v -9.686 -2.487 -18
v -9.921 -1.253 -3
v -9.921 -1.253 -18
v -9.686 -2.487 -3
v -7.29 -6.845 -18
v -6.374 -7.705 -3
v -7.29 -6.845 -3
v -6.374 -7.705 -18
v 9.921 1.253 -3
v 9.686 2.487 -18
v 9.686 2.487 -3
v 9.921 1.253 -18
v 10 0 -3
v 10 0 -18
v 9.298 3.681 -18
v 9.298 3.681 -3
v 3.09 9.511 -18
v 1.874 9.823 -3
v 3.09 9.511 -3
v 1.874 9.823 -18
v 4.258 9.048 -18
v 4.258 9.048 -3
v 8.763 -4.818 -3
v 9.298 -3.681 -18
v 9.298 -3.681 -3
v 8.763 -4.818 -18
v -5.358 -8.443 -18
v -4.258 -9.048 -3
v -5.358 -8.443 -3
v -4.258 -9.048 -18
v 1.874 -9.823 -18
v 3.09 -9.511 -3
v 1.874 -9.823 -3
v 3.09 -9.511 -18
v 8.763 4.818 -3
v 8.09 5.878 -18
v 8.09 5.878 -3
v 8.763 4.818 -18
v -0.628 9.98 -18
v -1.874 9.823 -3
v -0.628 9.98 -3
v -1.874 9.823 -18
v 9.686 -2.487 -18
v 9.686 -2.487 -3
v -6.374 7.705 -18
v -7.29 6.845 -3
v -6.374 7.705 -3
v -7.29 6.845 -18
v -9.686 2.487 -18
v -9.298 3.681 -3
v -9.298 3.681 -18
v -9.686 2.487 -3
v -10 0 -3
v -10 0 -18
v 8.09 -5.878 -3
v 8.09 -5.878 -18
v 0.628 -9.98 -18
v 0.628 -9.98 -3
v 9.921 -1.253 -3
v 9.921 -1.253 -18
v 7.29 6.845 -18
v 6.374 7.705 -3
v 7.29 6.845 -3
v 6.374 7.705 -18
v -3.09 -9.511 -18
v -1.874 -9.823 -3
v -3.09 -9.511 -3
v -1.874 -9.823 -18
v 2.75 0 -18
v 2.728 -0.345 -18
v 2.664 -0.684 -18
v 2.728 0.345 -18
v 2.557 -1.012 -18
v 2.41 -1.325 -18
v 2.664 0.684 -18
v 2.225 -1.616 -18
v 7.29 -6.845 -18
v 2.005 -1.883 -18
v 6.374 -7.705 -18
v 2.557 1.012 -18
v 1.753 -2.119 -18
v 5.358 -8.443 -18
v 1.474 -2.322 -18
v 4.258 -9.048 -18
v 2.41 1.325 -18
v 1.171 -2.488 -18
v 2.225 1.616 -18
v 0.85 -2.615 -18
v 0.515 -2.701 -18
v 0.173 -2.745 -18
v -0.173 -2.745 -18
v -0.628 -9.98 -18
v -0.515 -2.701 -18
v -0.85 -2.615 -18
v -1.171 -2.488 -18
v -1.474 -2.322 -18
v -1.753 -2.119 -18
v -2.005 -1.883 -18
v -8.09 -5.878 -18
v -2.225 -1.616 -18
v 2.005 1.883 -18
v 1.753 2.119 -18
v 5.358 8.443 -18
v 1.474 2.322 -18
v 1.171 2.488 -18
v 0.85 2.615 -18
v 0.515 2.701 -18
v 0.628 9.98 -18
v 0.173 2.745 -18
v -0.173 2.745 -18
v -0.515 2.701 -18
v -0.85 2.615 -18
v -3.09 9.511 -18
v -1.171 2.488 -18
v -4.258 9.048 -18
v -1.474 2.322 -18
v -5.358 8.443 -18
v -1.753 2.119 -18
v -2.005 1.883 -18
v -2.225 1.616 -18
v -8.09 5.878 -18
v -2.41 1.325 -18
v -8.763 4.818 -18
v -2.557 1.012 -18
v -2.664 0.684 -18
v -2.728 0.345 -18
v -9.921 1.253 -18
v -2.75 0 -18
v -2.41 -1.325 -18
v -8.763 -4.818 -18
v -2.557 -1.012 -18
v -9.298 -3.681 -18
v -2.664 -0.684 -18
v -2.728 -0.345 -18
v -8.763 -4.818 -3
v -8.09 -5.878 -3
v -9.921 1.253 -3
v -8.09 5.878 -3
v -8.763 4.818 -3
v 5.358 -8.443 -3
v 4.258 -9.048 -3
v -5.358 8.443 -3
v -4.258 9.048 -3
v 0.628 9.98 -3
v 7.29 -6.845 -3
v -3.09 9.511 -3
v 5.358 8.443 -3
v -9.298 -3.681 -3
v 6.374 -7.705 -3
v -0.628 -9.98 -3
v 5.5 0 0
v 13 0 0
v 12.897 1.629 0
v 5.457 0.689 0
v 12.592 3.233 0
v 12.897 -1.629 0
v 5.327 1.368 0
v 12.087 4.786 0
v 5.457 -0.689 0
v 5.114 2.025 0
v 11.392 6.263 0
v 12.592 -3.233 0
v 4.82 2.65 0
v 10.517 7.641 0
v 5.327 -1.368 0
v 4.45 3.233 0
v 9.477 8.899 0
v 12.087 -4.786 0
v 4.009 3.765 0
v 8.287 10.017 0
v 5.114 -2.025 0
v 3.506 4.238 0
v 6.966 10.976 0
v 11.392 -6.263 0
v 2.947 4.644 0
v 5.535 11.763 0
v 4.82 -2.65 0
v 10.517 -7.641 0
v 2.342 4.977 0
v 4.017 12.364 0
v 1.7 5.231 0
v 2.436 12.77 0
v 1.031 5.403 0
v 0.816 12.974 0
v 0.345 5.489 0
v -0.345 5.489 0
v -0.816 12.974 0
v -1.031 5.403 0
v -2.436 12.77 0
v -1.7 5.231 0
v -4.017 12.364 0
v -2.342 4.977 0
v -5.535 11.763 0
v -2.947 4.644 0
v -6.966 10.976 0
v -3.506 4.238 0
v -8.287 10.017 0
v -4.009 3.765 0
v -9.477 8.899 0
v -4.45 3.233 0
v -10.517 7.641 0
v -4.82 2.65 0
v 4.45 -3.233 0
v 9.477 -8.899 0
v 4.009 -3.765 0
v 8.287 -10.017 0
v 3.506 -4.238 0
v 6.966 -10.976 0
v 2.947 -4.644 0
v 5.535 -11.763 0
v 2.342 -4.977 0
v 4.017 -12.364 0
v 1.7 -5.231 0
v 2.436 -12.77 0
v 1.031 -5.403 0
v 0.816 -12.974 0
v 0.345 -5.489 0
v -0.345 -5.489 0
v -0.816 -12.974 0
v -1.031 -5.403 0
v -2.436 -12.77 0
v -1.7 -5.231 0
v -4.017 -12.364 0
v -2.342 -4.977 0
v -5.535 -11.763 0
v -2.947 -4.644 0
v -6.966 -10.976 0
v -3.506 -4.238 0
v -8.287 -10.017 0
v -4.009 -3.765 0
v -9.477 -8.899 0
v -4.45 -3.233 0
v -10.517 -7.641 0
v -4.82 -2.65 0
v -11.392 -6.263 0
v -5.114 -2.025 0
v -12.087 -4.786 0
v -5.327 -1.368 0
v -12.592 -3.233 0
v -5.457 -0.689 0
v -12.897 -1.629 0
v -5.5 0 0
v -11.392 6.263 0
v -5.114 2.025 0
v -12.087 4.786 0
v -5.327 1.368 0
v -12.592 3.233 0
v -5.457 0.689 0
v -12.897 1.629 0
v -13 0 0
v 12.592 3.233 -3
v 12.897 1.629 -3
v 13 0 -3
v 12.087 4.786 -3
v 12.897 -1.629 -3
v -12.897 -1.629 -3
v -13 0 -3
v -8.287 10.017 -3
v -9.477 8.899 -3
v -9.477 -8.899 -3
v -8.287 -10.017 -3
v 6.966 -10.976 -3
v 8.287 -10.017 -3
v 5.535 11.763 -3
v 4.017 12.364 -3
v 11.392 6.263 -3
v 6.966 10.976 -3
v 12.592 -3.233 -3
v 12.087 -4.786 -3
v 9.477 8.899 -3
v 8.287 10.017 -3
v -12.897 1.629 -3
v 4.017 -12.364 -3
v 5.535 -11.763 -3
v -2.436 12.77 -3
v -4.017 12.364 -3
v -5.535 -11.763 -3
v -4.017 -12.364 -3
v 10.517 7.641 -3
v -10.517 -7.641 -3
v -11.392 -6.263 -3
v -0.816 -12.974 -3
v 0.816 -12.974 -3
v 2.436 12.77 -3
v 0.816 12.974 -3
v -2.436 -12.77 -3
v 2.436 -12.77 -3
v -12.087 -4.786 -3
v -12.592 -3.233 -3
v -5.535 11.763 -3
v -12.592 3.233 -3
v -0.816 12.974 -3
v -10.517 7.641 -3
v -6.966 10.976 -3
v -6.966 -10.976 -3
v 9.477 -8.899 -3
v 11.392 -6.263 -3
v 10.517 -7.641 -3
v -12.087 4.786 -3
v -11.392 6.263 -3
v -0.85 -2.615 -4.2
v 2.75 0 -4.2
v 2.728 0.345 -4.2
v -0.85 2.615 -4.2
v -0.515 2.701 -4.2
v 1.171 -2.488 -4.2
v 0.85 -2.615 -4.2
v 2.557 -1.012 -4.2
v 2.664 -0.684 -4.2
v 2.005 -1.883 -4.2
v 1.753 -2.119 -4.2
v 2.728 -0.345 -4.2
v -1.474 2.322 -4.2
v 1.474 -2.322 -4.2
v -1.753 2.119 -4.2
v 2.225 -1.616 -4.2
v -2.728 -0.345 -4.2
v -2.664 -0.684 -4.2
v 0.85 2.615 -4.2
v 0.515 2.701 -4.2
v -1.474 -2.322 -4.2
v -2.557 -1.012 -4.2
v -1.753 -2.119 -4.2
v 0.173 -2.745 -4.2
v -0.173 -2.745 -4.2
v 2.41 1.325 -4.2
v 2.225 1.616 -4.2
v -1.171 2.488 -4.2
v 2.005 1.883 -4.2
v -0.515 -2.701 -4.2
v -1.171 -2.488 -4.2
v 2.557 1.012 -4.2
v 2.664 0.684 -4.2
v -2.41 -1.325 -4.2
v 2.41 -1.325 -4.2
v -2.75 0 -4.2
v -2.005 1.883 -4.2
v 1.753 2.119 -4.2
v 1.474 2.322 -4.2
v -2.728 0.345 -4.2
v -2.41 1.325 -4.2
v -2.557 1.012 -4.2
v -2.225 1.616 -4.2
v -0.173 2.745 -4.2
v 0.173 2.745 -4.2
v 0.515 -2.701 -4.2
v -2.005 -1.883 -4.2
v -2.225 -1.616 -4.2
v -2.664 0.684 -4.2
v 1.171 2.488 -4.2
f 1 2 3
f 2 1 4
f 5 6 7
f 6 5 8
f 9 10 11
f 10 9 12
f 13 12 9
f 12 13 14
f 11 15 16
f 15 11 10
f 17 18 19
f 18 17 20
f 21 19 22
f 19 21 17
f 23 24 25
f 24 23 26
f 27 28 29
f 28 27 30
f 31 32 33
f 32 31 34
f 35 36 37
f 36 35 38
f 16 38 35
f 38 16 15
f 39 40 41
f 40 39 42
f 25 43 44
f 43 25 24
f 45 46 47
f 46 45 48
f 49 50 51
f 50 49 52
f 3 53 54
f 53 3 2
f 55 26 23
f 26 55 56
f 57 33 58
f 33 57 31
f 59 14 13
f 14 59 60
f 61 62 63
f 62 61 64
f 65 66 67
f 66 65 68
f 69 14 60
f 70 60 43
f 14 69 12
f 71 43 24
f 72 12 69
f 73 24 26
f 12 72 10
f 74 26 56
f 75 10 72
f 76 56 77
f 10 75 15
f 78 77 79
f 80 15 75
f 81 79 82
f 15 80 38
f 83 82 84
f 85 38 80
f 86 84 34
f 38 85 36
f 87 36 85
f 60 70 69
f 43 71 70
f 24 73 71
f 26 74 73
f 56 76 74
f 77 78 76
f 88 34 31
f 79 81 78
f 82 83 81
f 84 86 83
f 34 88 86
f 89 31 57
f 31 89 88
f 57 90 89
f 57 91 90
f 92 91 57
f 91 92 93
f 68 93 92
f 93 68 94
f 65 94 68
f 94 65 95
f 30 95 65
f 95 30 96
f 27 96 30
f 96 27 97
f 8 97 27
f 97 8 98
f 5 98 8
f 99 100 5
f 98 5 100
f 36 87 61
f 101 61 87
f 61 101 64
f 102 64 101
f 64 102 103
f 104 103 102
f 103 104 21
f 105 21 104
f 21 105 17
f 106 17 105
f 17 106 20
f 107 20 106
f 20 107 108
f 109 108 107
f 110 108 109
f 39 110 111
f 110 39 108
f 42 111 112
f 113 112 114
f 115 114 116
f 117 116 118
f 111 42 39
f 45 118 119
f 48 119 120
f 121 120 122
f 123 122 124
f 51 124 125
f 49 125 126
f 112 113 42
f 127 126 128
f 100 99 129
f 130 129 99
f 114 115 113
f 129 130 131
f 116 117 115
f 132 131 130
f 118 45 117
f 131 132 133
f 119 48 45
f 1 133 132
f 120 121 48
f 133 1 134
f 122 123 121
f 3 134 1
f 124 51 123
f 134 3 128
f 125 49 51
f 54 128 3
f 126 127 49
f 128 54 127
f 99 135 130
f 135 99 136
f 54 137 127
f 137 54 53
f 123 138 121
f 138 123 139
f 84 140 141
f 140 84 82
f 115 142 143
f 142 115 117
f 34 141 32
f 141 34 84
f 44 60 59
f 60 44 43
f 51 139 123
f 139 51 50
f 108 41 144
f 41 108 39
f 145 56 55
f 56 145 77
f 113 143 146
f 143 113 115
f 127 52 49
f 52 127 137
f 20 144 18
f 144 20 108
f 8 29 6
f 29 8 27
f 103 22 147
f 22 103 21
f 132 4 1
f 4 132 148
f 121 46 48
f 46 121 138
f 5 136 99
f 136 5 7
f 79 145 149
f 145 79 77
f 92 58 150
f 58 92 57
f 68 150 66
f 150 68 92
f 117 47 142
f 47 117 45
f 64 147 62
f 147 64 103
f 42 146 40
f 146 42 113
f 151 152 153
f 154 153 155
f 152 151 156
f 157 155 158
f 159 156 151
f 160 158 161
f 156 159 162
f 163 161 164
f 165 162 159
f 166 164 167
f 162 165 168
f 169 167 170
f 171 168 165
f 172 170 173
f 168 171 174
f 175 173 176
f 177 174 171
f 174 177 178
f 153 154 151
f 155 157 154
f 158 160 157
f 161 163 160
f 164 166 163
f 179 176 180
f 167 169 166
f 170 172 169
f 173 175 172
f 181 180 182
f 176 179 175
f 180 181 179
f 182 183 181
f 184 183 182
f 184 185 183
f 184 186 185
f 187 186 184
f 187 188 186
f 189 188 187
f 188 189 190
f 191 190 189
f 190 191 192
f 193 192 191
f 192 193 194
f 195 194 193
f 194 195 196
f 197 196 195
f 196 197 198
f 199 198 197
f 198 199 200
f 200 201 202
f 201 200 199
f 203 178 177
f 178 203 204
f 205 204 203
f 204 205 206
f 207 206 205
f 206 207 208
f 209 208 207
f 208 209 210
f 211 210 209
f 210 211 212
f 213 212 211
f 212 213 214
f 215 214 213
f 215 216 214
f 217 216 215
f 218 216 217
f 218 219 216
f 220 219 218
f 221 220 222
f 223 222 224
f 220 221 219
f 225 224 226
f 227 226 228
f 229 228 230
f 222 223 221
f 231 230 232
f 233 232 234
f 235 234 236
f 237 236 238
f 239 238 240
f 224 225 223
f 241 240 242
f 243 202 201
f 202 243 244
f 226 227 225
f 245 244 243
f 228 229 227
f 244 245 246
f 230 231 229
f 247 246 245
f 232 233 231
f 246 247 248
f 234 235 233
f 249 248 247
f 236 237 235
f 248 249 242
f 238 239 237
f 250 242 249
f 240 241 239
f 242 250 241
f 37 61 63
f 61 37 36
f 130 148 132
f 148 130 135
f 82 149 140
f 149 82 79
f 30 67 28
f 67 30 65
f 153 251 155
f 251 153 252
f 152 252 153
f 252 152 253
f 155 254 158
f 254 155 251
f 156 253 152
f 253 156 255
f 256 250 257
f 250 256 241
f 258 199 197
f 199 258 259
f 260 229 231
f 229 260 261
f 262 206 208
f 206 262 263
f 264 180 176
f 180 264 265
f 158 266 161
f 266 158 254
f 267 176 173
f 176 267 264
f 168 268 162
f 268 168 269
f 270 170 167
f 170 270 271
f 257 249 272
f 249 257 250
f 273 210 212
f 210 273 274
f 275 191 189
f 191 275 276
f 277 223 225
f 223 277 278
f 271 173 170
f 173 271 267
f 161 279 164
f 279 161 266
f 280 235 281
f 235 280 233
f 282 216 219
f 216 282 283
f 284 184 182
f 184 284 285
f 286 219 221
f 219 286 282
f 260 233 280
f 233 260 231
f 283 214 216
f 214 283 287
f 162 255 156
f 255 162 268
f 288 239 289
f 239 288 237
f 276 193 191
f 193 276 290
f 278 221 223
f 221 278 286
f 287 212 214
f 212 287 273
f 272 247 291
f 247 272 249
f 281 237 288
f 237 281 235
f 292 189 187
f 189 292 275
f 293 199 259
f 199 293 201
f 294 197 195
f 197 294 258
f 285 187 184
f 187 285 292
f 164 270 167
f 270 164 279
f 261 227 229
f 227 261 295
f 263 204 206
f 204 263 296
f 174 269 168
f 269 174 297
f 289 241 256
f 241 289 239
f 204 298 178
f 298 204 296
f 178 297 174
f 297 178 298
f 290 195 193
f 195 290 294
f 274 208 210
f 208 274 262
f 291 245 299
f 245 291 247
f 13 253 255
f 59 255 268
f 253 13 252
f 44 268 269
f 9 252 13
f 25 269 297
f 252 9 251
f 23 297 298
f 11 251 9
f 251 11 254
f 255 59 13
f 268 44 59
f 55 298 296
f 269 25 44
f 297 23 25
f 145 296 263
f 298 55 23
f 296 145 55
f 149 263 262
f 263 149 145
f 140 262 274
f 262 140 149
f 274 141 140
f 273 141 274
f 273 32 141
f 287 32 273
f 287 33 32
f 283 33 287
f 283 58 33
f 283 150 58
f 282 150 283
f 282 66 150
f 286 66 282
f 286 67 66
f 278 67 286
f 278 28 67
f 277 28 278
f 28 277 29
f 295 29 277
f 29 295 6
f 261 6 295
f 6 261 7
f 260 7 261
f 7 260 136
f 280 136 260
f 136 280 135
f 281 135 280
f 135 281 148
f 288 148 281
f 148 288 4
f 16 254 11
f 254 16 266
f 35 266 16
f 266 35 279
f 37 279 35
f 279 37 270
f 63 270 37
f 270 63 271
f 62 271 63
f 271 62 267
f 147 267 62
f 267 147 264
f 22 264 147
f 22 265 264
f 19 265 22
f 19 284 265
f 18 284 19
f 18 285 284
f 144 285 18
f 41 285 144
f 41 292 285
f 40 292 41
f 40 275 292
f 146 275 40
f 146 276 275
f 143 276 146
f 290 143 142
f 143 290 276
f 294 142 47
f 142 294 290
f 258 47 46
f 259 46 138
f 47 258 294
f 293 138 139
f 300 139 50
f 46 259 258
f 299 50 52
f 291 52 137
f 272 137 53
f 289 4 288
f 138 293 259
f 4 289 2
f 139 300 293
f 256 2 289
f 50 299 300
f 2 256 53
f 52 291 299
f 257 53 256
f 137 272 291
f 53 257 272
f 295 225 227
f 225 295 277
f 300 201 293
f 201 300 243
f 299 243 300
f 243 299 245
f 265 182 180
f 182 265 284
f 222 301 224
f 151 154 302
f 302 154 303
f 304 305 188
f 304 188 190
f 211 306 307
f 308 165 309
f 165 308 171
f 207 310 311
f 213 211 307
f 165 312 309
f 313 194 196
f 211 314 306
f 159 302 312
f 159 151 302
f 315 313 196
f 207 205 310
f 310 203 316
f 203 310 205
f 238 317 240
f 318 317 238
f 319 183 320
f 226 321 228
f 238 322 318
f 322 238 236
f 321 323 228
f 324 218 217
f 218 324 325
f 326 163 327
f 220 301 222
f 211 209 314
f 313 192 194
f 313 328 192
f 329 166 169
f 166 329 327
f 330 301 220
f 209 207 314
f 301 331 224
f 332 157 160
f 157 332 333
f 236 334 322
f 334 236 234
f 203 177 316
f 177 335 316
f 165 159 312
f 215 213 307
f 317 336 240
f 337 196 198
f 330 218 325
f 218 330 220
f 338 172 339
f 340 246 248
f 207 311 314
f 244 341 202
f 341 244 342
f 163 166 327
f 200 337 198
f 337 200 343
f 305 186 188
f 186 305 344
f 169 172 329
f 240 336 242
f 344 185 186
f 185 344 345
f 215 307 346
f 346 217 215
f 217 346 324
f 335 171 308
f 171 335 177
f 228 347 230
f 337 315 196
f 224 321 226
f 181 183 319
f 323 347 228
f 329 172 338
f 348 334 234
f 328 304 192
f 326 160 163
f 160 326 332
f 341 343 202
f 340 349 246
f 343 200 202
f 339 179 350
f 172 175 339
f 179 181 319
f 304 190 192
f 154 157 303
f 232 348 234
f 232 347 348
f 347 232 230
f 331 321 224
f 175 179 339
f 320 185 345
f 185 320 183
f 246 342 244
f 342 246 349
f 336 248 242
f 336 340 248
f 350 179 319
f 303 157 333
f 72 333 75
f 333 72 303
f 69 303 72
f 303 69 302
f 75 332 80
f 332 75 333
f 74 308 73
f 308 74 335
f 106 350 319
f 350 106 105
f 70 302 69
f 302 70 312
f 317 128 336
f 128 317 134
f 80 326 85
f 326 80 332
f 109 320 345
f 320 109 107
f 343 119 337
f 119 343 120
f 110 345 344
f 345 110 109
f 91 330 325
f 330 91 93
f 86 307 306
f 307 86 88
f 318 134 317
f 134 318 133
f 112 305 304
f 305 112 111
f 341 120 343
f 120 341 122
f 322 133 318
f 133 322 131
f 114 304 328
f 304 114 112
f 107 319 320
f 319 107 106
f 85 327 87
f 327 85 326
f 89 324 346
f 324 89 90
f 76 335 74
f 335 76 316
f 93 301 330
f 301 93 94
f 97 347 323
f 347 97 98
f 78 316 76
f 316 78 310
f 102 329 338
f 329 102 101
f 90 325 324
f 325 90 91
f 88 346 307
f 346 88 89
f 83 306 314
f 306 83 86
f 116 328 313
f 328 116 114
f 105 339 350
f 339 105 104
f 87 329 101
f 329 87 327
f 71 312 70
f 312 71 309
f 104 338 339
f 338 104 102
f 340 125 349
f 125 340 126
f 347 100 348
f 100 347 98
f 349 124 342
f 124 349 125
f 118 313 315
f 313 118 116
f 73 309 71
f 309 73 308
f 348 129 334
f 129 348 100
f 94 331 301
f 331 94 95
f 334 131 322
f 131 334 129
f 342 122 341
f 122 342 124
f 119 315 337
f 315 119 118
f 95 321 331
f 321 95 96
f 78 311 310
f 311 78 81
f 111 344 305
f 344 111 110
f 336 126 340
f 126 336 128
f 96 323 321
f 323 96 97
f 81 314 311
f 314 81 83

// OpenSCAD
$fn = 50;


difference() {
	union() {
		translate(v = [0, 0, -18.0000000000]) {
			cylinder(h = 18, r = 10.0000000000);
		}
		translate(v = [0, 0, -3.0000000000]) {
			cylinder(h = 3, r = 13.0000000000);
		}
	}
	union() {
		translate(v = [0, 0, 0]) {
			rotate(a = [0, 0, 0]) {
				difference() {
					union() {
						#translate(v = [0, 0, -18.0000000000]) {
							cylinder(h = 18, r = 2.2500000000);
						}
						#translate(v = [0, 0, -4.2000000000]) {
							cylinder(h = 4.2000000000, r1 = 2.7500000000, r2 = 5.5000000000);
						}
						#translate(v = [0, 0, -18.0000000000]) {
							cylinder(h = 18, r = 2.7500000000);
						}
						#translate(v = [0, 0, -18.0000000000]) {
							cylinder(h = 18, r = 2.2500000000);
						}
					}
					union();
				}
			}
		}
	}
}
